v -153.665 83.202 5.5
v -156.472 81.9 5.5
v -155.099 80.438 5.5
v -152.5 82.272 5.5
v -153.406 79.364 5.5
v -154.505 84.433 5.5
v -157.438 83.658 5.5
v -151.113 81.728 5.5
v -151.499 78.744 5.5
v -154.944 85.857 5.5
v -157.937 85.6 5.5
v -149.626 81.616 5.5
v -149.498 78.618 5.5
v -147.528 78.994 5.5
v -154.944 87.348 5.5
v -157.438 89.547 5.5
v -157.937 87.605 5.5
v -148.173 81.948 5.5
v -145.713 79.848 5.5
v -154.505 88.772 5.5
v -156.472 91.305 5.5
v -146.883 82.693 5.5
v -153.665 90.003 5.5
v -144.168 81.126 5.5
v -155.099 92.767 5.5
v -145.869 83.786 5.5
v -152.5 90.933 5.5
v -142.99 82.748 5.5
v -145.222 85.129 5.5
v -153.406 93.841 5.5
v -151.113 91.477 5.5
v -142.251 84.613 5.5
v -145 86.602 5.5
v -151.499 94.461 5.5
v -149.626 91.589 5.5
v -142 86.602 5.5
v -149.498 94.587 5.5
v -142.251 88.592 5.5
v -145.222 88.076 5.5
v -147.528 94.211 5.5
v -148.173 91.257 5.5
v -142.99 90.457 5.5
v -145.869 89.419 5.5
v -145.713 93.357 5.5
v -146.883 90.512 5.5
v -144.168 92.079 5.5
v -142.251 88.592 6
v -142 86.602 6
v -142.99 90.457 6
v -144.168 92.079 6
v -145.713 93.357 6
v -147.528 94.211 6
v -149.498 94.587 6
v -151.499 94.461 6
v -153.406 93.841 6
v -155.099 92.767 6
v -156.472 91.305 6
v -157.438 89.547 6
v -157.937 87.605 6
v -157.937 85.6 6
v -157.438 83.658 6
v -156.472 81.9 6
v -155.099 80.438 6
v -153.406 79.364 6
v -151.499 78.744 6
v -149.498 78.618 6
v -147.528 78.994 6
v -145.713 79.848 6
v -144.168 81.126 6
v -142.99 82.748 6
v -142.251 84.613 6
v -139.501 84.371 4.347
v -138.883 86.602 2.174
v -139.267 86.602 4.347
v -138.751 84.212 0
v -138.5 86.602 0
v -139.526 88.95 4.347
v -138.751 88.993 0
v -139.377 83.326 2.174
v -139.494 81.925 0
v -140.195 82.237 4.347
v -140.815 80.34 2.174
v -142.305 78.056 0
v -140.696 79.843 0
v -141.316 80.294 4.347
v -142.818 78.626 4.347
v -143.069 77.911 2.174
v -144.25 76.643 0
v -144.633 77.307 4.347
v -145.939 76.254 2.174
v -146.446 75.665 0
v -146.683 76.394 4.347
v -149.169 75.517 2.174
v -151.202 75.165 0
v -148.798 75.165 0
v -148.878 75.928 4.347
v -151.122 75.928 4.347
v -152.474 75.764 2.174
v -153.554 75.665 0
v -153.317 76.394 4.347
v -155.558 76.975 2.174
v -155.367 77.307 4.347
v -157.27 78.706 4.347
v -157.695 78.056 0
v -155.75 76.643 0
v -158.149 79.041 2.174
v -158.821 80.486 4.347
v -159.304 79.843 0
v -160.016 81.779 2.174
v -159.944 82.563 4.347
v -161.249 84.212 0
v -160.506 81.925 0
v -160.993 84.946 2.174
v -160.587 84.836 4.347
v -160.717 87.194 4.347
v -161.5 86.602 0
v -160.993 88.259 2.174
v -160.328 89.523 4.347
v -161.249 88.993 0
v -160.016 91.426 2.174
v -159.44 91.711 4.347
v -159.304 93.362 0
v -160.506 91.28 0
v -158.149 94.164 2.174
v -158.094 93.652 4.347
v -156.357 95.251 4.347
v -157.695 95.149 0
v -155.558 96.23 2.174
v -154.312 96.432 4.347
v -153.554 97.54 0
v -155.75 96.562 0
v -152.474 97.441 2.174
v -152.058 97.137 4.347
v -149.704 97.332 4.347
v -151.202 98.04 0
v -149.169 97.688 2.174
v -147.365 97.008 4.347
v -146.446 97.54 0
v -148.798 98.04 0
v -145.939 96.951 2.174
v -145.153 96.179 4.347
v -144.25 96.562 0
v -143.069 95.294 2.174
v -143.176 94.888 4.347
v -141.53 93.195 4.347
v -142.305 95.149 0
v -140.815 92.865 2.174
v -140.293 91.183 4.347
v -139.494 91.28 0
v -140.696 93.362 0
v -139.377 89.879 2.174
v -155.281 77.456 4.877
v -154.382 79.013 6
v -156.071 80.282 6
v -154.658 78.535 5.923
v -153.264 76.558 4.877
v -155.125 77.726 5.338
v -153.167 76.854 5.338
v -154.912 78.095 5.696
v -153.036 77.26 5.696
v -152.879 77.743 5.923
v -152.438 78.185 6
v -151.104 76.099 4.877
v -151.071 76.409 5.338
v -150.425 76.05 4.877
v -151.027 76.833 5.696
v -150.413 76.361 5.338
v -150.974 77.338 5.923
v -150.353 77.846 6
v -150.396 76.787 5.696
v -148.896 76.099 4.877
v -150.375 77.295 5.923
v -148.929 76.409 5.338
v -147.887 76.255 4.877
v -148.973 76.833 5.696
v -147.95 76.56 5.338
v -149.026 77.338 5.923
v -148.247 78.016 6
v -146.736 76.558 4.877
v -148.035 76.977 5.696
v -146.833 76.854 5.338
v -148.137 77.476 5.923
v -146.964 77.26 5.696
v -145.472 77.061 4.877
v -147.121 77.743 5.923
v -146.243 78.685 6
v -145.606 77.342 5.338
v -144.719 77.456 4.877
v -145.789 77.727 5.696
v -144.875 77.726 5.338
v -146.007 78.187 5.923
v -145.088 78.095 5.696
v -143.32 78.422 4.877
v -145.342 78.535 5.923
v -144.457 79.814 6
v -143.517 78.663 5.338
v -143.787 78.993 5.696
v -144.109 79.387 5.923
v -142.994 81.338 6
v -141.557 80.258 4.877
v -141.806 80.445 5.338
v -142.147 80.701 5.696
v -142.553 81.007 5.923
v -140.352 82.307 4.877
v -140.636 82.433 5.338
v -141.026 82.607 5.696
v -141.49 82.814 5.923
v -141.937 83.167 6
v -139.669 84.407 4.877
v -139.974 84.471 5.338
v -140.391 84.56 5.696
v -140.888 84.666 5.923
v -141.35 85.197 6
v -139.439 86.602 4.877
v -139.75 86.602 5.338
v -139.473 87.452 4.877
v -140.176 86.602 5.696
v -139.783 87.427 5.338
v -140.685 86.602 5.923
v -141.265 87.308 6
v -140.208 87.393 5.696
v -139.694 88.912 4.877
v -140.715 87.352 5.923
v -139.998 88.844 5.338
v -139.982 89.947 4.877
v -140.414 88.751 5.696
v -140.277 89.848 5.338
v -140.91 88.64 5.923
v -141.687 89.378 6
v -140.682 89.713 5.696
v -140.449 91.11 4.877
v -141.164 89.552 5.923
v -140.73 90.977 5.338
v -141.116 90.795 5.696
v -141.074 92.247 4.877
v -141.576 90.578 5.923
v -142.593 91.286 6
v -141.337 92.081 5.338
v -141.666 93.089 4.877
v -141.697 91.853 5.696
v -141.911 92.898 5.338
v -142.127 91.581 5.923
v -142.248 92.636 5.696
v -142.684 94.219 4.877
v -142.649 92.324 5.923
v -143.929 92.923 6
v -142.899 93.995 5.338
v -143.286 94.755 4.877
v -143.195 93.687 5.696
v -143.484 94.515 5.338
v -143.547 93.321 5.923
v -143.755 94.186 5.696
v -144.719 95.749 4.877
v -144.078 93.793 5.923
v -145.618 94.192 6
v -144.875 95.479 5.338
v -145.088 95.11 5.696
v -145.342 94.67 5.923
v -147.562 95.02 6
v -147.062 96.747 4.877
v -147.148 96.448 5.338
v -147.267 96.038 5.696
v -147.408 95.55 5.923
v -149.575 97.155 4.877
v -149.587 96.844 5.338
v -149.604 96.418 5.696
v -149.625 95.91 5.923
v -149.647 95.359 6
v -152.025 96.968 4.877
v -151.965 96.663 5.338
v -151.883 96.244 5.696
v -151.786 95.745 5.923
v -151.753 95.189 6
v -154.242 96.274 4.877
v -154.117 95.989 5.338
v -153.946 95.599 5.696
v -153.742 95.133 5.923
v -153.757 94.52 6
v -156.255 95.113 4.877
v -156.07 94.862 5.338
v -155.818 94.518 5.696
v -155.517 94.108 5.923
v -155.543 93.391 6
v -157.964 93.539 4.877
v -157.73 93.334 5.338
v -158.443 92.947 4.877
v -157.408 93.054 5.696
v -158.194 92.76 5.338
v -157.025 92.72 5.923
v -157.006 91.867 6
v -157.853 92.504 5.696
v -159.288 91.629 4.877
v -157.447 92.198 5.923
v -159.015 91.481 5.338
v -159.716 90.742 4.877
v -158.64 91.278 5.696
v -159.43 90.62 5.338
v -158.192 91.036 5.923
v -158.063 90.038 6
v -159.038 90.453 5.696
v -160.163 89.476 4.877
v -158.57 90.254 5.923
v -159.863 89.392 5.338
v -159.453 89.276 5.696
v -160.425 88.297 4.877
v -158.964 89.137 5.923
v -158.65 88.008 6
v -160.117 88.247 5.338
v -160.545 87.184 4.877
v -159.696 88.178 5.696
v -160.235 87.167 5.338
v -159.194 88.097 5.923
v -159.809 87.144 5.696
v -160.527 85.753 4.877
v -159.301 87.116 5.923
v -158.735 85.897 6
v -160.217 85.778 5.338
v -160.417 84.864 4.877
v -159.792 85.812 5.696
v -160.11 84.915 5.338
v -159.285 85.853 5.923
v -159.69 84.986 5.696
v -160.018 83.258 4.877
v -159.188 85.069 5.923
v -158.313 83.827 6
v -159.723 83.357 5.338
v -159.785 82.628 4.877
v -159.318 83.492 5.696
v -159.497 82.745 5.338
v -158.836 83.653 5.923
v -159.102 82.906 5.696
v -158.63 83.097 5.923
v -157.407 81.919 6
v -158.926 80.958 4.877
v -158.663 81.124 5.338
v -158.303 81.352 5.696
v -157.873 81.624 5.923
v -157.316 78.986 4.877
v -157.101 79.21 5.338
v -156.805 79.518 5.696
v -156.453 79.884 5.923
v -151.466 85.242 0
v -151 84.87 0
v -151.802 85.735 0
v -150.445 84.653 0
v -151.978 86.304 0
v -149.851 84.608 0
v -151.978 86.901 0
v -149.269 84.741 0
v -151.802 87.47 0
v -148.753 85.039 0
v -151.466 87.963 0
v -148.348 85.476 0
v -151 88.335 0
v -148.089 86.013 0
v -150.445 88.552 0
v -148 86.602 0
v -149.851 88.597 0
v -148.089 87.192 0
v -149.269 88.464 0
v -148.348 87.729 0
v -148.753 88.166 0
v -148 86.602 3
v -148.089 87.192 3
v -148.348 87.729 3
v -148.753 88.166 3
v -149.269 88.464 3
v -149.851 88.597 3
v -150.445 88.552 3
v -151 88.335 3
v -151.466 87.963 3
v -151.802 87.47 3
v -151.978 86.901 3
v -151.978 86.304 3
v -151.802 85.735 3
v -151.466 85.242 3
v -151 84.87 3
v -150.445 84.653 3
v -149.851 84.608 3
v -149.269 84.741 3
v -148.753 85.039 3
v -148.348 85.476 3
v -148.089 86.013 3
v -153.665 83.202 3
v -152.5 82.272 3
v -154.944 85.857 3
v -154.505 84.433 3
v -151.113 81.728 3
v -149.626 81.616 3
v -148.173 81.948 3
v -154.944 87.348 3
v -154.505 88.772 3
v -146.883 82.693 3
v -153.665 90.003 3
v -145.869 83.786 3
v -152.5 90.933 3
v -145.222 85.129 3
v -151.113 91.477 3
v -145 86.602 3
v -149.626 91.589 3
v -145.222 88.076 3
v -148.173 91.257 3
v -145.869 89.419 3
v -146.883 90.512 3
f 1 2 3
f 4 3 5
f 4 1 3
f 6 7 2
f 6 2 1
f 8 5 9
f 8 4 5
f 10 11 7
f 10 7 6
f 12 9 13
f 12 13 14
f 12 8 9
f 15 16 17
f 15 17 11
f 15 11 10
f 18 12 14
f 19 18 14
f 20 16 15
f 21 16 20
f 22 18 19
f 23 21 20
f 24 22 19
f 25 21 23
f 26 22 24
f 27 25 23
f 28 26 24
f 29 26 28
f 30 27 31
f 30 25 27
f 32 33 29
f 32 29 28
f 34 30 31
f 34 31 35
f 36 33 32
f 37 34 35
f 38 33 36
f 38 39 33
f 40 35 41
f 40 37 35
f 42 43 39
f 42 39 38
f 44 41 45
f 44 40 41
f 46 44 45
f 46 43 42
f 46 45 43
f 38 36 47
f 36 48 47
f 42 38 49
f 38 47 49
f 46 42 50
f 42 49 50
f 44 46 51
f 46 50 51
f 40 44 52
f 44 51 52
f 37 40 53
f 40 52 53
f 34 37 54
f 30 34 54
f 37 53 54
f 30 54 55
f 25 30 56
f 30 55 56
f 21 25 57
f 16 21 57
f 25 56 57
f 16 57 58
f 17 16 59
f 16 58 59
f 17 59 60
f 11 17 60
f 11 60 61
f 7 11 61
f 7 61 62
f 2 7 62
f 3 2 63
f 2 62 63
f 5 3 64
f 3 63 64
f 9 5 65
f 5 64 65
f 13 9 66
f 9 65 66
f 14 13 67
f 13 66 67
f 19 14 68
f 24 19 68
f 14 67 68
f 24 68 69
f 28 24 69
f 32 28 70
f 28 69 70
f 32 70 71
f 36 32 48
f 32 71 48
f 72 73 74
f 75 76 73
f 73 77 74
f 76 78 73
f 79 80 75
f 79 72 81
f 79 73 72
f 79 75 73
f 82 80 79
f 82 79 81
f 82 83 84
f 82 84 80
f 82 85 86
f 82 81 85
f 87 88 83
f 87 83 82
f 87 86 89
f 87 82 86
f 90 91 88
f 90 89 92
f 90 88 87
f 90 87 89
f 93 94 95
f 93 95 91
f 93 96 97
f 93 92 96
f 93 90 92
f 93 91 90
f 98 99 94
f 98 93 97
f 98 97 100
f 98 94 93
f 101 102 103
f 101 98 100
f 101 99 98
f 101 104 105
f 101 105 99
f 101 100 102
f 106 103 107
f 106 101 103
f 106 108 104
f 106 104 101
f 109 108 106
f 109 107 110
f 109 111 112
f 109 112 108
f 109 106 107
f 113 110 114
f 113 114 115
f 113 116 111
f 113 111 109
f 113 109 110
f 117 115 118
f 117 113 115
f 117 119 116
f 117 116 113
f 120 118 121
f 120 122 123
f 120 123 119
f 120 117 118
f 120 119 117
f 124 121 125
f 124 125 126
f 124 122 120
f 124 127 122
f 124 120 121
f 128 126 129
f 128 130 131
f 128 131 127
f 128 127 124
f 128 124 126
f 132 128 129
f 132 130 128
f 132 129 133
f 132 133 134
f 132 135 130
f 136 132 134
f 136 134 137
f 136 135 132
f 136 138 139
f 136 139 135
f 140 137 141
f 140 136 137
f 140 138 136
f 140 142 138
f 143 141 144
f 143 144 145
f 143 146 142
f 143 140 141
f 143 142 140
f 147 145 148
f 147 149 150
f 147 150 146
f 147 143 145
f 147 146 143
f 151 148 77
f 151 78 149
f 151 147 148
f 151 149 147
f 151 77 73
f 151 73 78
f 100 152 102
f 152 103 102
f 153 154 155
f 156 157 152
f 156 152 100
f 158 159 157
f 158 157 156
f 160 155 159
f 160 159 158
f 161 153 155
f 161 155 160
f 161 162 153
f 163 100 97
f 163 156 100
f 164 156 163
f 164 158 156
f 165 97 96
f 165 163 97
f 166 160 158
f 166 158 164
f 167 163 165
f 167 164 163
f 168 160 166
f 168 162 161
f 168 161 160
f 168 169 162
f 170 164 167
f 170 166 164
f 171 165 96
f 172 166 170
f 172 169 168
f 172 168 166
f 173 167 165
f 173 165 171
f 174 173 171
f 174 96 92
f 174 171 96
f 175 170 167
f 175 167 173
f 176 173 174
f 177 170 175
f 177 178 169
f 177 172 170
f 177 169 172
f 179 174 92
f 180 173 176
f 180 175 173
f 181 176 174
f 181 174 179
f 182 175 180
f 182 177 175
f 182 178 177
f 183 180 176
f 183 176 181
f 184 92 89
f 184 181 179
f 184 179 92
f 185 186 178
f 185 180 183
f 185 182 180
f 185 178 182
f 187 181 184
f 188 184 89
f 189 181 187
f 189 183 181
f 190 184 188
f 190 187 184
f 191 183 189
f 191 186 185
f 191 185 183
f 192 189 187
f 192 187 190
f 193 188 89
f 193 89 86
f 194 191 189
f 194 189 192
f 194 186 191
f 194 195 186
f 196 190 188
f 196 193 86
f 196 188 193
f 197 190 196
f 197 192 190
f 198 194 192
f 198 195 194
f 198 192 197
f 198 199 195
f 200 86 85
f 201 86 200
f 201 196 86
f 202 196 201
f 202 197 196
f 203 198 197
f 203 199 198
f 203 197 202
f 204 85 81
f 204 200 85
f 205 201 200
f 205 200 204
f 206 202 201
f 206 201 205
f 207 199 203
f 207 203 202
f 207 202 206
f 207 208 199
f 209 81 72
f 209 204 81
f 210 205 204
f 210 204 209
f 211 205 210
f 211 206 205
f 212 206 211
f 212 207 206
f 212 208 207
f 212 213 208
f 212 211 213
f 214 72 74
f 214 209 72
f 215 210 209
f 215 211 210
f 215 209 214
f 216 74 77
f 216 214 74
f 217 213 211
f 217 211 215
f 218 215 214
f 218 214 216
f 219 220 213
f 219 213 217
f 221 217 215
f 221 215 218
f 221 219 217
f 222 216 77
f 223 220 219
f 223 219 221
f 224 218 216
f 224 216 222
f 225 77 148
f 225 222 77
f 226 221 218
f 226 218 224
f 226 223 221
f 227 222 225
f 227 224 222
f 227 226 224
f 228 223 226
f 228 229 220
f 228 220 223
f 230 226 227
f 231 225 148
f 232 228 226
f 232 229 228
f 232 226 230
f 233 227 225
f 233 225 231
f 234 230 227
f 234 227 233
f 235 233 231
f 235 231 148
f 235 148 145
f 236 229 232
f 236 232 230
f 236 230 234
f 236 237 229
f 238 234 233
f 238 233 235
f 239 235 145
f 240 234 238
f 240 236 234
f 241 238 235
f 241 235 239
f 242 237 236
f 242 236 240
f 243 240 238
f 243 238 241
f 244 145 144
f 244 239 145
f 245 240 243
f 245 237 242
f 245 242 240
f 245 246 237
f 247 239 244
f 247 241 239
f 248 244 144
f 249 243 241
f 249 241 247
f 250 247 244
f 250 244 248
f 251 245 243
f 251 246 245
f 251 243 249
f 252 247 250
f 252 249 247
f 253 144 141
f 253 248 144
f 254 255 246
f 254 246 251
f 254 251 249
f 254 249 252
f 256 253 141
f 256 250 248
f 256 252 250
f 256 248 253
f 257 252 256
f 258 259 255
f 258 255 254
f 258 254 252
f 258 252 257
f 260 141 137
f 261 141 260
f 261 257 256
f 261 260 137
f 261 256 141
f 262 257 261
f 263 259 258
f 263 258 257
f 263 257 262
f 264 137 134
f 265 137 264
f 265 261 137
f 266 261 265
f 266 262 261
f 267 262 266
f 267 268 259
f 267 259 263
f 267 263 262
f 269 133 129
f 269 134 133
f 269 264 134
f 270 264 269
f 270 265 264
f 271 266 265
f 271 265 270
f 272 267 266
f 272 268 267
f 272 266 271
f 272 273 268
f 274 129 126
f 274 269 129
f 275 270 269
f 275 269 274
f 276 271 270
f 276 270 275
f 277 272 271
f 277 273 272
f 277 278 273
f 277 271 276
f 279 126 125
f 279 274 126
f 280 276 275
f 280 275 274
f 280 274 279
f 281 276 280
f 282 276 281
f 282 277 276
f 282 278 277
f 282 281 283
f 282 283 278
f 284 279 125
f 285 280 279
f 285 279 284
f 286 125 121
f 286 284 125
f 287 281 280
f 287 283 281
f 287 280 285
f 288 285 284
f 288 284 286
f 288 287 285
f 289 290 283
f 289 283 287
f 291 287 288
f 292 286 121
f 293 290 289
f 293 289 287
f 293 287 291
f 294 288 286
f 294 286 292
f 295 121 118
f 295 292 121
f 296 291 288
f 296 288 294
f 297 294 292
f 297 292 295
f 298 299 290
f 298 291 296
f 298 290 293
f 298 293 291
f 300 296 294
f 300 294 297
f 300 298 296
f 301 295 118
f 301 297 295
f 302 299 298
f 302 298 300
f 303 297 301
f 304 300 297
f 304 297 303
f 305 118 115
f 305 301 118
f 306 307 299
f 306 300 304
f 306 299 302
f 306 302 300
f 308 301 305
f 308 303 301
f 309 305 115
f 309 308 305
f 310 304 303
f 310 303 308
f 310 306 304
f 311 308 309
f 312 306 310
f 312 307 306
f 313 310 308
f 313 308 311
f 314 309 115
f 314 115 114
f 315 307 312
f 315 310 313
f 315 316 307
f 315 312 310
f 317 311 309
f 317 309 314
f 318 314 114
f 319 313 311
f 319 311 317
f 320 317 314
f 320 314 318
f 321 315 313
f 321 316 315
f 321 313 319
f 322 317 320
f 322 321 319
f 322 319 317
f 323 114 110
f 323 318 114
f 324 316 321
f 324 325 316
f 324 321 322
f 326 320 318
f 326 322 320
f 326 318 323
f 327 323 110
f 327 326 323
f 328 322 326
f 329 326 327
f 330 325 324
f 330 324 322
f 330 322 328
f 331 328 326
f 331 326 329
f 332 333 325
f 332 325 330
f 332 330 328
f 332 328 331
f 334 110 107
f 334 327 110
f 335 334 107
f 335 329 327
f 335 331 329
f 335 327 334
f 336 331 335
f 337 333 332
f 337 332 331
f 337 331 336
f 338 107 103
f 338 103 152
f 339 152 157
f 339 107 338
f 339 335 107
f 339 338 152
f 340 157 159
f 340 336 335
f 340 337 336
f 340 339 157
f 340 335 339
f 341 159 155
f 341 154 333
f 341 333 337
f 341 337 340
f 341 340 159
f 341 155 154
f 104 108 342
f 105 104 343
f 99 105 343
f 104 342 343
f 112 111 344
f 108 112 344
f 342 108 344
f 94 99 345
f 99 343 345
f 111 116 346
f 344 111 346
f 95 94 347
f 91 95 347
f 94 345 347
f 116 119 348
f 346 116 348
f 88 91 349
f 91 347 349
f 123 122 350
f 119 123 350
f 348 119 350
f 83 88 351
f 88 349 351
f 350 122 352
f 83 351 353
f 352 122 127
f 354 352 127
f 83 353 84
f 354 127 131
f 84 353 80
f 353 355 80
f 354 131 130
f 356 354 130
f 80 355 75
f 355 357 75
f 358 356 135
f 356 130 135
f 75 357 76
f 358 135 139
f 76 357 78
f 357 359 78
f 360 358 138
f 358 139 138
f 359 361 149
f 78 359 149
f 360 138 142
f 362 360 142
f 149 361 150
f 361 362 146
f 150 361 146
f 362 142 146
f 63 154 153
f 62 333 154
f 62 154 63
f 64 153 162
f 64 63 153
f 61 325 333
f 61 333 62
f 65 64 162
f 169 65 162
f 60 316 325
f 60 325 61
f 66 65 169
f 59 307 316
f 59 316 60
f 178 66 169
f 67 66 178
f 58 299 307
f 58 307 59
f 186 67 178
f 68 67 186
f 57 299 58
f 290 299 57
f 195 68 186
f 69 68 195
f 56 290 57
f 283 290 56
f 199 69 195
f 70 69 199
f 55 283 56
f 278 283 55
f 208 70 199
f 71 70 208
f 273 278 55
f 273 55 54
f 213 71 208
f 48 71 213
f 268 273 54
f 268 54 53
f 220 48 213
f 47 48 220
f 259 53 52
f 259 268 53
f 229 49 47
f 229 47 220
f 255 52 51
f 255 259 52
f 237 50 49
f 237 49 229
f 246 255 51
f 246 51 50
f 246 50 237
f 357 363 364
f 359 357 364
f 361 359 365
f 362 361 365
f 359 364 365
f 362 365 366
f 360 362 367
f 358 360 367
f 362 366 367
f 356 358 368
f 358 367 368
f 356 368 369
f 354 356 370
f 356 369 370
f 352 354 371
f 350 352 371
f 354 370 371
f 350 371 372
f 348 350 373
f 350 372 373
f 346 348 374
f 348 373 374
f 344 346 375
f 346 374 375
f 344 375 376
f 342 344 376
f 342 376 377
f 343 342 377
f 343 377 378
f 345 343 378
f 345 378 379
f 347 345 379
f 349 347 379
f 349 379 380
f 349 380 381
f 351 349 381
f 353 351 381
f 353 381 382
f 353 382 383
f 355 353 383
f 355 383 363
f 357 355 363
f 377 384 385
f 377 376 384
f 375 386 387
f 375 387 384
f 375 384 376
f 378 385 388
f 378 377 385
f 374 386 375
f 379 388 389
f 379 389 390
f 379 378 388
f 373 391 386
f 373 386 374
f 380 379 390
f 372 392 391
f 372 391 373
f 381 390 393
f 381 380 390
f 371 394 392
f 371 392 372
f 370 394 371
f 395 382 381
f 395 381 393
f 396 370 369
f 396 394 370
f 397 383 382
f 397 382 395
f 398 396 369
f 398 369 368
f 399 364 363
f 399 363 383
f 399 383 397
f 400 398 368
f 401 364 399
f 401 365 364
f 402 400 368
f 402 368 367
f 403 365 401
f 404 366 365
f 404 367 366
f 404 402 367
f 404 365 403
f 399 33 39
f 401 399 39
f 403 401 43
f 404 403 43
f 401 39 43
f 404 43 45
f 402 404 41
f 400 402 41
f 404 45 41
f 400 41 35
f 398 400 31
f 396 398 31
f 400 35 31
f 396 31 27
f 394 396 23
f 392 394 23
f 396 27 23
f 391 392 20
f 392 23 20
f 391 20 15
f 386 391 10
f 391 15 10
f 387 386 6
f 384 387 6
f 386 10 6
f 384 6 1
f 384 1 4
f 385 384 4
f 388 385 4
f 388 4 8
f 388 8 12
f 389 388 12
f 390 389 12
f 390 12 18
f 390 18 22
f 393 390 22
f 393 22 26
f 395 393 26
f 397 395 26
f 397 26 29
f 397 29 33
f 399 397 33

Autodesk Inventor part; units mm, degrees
ref_plane "YZ Plane" through (0, 0, 0) normal (1, 0, 0) x (0, 1, 0)
ref_plane "XZ Plane" through (0, 0, 0) normal (0, 1, 0) x (-1, 0, 0)
ref_plane "XY Plane" through (0, 0, 0) normal (0, 0, 1) x (1, 0, 0)
ref_plane "Work Plane1" through (0, 0, 0) normal (0, 0, 1) x (1, 0, 0)
sketch "Sketch1" plane through (0, 0, 0) normal (0, 0, 1) x (1, 0, 0)
  circle A0 centre (-150, 86.6025) radius 13 projected
  circle A1 centre (0, -173.2051) radius 13 projected
  circle A2 centre (0, -173.2051) radius 11.5
  circle A3 centre (-150, 86.6025) radius 11.5
  circle A4 centre (150, 86.6025) radius 11.5
  circle A5 centre (-150, 86.6025) radius 13 projected
  point P0 (0, 0)
  dimension "d0" = 23
  dimension "d1" = 23
  dimension "d2" = 23
extrude "Extrusion1" add sketch "Sketch1" along normal blind 6 draft -10 contours A3
fillet "Fillet1" radius 2 1 edges at (-160.442, 86.6025, 6)
sketch "Sketch2" plane through (-150, 86.6025, 6) normal (0, 0, 1) x (1, 0, 0)
  circle A0 centre (0, 0) radius 8.7638 projected
  circle A1 centre (0, 0) radius 5
  point P0 (150, -86.6025)
  dimension "d6" = 10
extrude "Extrusion2" cut sketch "Sketch2" against normal blind 3 contours A1
sketch "Sketch3" plane through (-150, 86.6025, 3) normal (0, 0, 1) x (1, 0, 0)
  circle A0 centre (0, 0) radius 5 projected
  circle A1 centre (0, 0) radius 2
  point P0 (150, -86.6025)
  dimension "d9" = 4
extrude "Extrusion3" cut sketch "Sketch3" against normal blind 3 contours A1
sketch "Sketch4" plane through (-150, 86.6025, 6) normal (0, 0, 1) x (1, 0, 0)
  circle A0 centre (0, 0) radius 5 projected
  circle A1 centre (0, 0) radius 8.7638 projected
  circle A2 centre (0, 0) radius 8
  point P0 (150, -86.6025)
  dimension "d12" = 16
extrude "Extrusion4" cut sketch "Sketch4" against normal blind 0.5 contours A2
properties part number "foot" material "Rubber"
